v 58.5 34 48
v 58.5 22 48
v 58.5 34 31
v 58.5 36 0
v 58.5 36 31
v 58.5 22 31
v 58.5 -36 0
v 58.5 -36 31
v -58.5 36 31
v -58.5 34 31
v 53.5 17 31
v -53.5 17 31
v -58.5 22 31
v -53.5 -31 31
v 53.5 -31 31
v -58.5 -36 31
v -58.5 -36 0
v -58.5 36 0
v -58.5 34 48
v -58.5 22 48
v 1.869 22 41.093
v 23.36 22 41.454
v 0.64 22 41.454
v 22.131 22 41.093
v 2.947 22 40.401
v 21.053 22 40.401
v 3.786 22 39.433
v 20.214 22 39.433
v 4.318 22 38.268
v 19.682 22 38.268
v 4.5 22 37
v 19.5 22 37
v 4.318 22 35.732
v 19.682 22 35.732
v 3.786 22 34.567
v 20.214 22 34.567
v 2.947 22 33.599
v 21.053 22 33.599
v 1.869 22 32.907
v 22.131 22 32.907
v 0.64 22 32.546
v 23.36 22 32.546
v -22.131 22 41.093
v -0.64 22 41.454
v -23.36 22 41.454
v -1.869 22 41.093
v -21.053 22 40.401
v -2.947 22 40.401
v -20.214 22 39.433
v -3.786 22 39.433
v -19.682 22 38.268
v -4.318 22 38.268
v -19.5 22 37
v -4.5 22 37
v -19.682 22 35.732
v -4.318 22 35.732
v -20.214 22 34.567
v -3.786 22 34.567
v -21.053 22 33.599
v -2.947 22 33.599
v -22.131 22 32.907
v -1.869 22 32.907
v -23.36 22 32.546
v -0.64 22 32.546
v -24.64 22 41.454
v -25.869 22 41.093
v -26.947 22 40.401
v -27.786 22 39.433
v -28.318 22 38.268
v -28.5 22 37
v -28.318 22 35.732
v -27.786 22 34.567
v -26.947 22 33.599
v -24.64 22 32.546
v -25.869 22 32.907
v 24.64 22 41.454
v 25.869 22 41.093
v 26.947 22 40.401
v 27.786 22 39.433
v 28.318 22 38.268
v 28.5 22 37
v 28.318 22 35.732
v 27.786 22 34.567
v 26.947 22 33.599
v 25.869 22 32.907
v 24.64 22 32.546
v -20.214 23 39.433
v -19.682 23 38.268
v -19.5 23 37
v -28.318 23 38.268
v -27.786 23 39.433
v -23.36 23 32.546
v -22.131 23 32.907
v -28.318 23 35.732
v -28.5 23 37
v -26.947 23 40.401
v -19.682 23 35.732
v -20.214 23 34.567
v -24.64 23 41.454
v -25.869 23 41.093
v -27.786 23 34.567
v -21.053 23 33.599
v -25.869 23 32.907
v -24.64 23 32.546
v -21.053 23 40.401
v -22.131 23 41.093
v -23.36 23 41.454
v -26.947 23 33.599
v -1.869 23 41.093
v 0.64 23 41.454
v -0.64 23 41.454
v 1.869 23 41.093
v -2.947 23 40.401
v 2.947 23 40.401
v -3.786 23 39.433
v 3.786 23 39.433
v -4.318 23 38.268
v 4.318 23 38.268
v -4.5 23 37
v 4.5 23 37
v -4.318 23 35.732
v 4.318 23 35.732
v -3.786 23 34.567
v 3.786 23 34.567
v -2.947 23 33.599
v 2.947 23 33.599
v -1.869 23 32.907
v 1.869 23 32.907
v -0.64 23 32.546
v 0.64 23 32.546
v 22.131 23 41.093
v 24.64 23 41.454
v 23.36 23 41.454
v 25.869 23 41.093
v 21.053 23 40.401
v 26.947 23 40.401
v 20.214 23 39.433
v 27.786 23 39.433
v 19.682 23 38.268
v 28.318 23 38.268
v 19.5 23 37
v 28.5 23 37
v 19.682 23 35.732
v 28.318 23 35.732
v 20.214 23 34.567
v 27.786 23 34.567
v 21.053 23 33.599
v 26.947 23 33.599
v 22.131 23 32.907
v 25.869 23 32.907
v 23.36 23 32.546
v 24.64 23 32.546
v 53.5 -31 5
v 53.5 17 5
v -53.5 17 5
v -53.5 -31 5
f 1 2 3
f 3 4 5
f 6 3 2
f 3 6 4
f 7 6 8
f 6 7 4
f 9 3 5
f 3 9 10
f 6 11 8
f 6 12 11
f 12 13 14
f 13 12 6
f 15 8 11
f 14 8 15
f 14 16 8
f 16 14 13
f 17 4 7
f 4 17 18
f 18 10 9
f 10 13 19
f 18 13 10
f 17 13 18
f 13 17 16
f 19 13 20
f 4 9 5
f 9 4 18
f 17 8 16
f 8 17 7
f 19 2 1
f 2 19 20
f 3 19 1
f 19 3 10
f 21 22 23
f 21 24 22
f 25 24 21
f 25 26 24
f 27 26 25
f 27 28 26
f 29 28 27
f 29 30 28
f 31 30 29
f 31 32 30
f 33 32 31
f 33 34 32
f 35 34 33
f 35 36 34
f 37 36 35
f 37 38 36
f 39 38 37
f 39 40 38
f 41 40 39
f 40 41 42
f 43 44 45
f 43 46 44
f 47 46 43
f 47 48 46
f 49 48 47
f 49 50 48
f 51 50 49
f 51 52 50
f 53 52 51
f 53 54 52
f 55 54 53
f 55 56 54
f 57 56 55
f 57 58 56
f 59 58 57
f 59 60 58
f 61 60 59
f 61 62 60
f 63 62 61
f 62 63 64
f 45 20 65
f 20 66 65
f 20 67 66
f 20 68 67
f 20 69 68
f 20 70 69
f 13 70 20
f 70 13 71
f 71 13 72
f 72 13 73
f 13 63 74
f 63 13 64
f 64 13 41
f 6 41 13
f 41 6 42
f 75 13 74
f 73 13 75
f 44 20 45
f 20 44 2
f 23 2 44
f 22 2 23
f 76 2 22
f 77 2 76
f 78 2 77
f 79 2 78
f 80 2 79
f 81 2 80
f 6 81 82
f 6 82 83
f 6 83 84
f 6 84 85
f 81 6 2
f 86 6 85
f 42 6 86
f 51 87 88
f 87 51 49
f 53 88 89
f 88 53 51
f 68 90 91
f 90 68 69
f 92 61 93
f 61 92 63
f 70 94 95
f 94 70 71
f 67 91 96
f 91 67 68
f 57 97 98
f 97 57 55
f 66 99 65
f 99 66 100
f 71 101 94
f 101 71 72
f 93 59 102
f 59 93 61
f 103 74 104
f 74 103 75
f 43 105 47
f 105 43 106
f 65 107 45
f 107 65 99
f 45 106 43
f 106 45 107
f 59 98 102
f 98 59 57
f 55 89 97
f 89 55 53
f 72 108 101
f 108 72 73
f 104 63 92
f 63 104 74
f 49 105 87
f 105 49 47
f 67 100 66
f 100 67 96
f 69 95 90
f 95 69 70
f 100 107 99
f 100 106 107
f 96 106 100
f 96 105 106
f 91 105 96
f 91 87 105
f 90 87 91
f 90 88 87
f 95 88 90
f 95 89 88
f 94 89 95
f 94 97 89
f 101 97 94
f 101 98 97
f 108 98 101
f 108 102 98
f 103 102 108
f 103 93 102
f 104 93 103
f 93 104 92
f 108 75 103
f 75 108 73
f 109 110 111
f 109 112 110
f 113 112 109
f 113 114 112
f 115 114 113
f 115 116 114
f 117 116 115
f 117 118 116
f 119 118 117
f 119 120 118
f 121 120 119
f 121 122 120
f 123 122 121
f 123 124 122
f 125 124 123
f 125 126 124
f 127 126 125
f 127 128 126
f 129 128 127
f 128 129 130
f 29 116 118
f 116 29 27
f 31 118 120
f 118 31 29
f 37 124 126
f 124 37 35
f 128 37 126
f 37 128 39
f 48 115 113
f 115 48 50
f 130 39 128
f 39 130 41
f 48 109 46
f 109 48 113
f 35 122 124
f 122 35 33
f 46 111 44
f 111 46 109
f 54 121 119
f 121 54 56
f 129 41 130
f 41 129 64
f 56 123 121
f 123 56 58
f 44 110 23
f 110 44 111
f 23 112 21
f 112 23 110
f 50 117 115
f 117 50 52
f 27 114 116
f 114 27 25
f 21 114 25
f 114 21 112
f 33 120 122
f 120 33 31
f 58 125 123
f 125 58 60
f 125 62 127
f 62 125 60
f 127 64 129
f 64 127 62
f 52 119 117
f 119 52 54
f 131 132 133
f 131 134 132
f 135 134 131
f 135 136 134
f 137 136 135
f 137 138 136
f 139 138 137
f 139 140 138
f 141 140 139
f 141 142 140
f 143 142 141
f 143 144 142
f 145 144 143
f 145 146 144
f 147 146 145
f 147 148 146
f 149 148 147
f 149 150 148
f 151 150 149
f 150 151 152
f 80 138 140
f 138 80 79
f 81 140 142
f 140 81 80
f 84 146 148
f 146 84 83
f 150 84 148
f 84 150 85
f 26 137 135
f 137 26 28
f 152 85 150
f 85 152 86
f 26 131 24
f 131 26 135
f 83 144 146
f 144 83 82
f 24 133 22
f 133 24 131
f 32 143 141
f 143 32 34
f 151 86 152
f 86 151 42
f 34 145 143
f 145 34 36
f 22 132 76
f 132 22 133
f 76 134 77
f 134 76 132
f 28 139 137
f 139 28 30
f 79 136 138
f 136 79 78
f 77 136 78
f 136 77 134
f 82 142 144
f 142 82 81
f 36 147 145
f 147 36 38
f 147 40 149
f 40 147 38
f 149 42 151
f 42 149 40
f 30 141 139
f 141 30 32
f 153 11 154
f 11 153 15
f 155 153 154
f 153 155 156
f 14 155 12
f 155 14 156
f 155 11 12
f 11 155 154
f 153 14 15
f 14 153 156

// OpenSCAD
// file: lib/commerce_forms.scad
// Original parametric printable prototypes. Dimensions in millimeters.
// CAD is the manufacturing authority; Three.js gallery geometry is a stylized preview.
// No external copyrighted silhouettes, brands, logos or character geometry.
$fn=56;
module market_lantern(v=1) {
  r=27+v*2; h=76+v*6; wall=2.8;
  difference() {
    cylinder(r=r,h=h);
    translate([0,0,-1]) cylinder(r=r-wall,h=h+2);
    for (tier=[0:3], j=[0:7+v]) {
      a=360*j/(8+v)+tier*15;
      rotate([0,0,a])
        translate([r-1,0,17+tier*(h-33)/3])
          rotate([0,90,0]) cylinder(r=2.2+(v%3)*.5,h=10,center=true,$fn=18);
    }
  }
}
module market_figurine(v=1) {
  r=18+v;
  union() {
    cylinder(r=29,h=6);
    translate([0,0,7]) scale([1,0.85,1.15]) sphere(r=r);
    translate([0,0,35]) scale([1,.91,.84]) sphere(r=r*.78);
    for (s=[-1,1]) {
      translate([s*(r*.58),0,49])
        rotate([0,s*13,0]) cylinder(r1=5+v*.4,r2=1,h=10+v*2);
      translate([s*(r*.73),-2,20]) scale([.36,.55,.67]) sphere(r=r*.75);
    }
    translate([0,-r*.62,39]) sphere(r=3.5+v*.2);
    for(s=[-1,1])translate([s*7,-r*.72,43])sphere(r=1.8);
  }
}
module market_scenery(v=1) {
  union() {
    translate([-52,-32,0]) cube([104,64,4]);
    for (i=[0:2+v%2]) {
      x=-40+i*24;
      translate([x, -14+(i%2)*12,3.8])
        cube([15+v*2,19,13+v*3]);
      translate([x+2,-13+(i%2)*12,16+v*3])
        cube([11+v*2,15,3]);
    }
    for(i=[-1,1]) {
      translate([i*42,20,3.8]) cylinder(r=5,h=12+v*4);
      translate([i*42,20,15+v*4]) sphere(r=6);
    }
  }
}
module market_organizer(v=1) {
  w=104+v*5;d=69+v*3;h=32+v*3; columns=2+v%3;
  difference() {
    translate([-w/2,-d/2,0]) cube([w,d,h]);
    for(i=[0:columns-1])
      translate([-w/2+3+i*(w-6)/columns,-d/2+3,4])
        cube([(w-6)/columns-3,d-6,h+3]);
  }
}
module market_display(v=1) {
  union() {
    cylinder(r=34+v*2,h=6);
    translate([0,0,5.8]) cylinder(r1=12+v,r2=9,h=26+v*3);
    translate([0,0,30+v*3]) cylinder(r=25+v,h=5);
    for(s=[-1,1])
      translate([s*(16+v),0,34+v*3])
        cube([5,31,10],center=true);
  }
}
module market_gaming(v=1) {
  w=102+v*5;d=66+v*2; h=22+v*3;
  difference() {
    union() {
      translate([-w/2,-d/2,0]) cube([w,d,h]);
      translate([-w/2, d/2-14,h-1]) cube([w,12,15+v]);
    }
    translate([-w/2+5,-d/2+5,5]) cube([w-10,d-24,h+12]);
    for(i=[-1,0,1])
      translate([i*24,d/2-13,h+6]) rotate([90,0,0])
        cylinder(r=3.6+v*.3,h=16,$fn=22);
  }
}
module market_jewelry(v=1) {
  union() {
    translate([-40,-26,0]) cube([80,52,6]);
    for (i=[0:3+v%2]) {
      x=-29+i*58/(3+v%2);
      translate([x,0,5.8]) cylinder(r=3.2,h=42+v*5,$fn=24);
      translate([x,0,46+v*5]) sphere(r=5);
    }
    translate([-33,-5,42+v*5]) cube([66,9,6]);
    for(i=[0:4])translate([-25+i*12,0,46+v*5])
      cylinder(r1=4,r2=1.5,h=7,$fn=20);
  }
}
module market_planter(v=1) {
  r=34+v*2; h=48+v*6; w=3.2;
  difference() {
    union() {
      cylinder(r=r,h=h);
      for(i=[0:9+v])
        rotate([0,0,360*i/(10+v)])
          translate([r-.5,-1.6,2]) cube([2.2,3.2,h-4]);
    }
    translate([0,0,3.8]) cylinder(r=r-w,h=h+2);
    translate([0,0,-1]) cylinder(r=2.8,h=7,$fn=24);
  }
}
module market_gift(v=1,label="CUSTOM") {
  w=100+v*6;d=49+v*3;
  difference() {
    union() {
      hull()for(x=[-w/2+7,w/2-7],y=[-d/2+7,d/2-7])
        translate([x,y,0]) cylinder(r=7,h=6,$fn=24);
      translate([0,0,5.8]) linear_extrude(height=2.2)
        text(label,size=max(9,18-v),halign="center",valign="center",
             font="Liberation Sans:style=Bold");
    }
    if(v==3)for(x=[-w/2+10,w/2-10])
      translate([x,d/2-10,-1]) cylinder(r=2.5,h=10,$fn=24);
  }
}
module market_cosplay(v=1) {
  r=28+v*2;
  difference() {
    union() {
      cylinder(r=r,h=4.5,$fn=8+v*2);
      for(i=[0:4+v])
        rotate([0,0,360*i/(5+v)])
          translate([r*.45,0,4.2]) cylinder(r=4.2,h=1.8,$fn=6);
      cylinder(r=12+v*.5,h=7,$fn=5+v);
    }
    translate([0,r*.70,-1])cylinder(r=3.3,h=10,$fn=24);
  }
}
module commercial_form(family="lantern",variant=1,label="CUSTOM") {
  if(family=="lantern")market_lantern(variant);
  else if(family=="figurine")market_figurine(variant);
  else if(family=="scenery")market_scenery(variant);
  else if(family=="organizer")market_organizer(variant);
  else if(family=="display")market_display(variant);
  else if(family=="gaming")market_gaming(variant);
  else if(family=="jewelry")market_jewelry(variant);
  else if(family=="planter")market_planter(variant);
  else if(family=="gift")market_gift(variant,label);
  else if(family=="cosplay")market_cosplay(variant);
  else assert(false,str("Unknown family: ",family));
}
// main file
// Original 3D printable CAD prototype for Tabletop Dice Tray
// Millimeter units; edit parameters and print-test before commercial shipment.
use <lib/commerce_forms.scad>
commercial_form(family="gaming",variant=3);
